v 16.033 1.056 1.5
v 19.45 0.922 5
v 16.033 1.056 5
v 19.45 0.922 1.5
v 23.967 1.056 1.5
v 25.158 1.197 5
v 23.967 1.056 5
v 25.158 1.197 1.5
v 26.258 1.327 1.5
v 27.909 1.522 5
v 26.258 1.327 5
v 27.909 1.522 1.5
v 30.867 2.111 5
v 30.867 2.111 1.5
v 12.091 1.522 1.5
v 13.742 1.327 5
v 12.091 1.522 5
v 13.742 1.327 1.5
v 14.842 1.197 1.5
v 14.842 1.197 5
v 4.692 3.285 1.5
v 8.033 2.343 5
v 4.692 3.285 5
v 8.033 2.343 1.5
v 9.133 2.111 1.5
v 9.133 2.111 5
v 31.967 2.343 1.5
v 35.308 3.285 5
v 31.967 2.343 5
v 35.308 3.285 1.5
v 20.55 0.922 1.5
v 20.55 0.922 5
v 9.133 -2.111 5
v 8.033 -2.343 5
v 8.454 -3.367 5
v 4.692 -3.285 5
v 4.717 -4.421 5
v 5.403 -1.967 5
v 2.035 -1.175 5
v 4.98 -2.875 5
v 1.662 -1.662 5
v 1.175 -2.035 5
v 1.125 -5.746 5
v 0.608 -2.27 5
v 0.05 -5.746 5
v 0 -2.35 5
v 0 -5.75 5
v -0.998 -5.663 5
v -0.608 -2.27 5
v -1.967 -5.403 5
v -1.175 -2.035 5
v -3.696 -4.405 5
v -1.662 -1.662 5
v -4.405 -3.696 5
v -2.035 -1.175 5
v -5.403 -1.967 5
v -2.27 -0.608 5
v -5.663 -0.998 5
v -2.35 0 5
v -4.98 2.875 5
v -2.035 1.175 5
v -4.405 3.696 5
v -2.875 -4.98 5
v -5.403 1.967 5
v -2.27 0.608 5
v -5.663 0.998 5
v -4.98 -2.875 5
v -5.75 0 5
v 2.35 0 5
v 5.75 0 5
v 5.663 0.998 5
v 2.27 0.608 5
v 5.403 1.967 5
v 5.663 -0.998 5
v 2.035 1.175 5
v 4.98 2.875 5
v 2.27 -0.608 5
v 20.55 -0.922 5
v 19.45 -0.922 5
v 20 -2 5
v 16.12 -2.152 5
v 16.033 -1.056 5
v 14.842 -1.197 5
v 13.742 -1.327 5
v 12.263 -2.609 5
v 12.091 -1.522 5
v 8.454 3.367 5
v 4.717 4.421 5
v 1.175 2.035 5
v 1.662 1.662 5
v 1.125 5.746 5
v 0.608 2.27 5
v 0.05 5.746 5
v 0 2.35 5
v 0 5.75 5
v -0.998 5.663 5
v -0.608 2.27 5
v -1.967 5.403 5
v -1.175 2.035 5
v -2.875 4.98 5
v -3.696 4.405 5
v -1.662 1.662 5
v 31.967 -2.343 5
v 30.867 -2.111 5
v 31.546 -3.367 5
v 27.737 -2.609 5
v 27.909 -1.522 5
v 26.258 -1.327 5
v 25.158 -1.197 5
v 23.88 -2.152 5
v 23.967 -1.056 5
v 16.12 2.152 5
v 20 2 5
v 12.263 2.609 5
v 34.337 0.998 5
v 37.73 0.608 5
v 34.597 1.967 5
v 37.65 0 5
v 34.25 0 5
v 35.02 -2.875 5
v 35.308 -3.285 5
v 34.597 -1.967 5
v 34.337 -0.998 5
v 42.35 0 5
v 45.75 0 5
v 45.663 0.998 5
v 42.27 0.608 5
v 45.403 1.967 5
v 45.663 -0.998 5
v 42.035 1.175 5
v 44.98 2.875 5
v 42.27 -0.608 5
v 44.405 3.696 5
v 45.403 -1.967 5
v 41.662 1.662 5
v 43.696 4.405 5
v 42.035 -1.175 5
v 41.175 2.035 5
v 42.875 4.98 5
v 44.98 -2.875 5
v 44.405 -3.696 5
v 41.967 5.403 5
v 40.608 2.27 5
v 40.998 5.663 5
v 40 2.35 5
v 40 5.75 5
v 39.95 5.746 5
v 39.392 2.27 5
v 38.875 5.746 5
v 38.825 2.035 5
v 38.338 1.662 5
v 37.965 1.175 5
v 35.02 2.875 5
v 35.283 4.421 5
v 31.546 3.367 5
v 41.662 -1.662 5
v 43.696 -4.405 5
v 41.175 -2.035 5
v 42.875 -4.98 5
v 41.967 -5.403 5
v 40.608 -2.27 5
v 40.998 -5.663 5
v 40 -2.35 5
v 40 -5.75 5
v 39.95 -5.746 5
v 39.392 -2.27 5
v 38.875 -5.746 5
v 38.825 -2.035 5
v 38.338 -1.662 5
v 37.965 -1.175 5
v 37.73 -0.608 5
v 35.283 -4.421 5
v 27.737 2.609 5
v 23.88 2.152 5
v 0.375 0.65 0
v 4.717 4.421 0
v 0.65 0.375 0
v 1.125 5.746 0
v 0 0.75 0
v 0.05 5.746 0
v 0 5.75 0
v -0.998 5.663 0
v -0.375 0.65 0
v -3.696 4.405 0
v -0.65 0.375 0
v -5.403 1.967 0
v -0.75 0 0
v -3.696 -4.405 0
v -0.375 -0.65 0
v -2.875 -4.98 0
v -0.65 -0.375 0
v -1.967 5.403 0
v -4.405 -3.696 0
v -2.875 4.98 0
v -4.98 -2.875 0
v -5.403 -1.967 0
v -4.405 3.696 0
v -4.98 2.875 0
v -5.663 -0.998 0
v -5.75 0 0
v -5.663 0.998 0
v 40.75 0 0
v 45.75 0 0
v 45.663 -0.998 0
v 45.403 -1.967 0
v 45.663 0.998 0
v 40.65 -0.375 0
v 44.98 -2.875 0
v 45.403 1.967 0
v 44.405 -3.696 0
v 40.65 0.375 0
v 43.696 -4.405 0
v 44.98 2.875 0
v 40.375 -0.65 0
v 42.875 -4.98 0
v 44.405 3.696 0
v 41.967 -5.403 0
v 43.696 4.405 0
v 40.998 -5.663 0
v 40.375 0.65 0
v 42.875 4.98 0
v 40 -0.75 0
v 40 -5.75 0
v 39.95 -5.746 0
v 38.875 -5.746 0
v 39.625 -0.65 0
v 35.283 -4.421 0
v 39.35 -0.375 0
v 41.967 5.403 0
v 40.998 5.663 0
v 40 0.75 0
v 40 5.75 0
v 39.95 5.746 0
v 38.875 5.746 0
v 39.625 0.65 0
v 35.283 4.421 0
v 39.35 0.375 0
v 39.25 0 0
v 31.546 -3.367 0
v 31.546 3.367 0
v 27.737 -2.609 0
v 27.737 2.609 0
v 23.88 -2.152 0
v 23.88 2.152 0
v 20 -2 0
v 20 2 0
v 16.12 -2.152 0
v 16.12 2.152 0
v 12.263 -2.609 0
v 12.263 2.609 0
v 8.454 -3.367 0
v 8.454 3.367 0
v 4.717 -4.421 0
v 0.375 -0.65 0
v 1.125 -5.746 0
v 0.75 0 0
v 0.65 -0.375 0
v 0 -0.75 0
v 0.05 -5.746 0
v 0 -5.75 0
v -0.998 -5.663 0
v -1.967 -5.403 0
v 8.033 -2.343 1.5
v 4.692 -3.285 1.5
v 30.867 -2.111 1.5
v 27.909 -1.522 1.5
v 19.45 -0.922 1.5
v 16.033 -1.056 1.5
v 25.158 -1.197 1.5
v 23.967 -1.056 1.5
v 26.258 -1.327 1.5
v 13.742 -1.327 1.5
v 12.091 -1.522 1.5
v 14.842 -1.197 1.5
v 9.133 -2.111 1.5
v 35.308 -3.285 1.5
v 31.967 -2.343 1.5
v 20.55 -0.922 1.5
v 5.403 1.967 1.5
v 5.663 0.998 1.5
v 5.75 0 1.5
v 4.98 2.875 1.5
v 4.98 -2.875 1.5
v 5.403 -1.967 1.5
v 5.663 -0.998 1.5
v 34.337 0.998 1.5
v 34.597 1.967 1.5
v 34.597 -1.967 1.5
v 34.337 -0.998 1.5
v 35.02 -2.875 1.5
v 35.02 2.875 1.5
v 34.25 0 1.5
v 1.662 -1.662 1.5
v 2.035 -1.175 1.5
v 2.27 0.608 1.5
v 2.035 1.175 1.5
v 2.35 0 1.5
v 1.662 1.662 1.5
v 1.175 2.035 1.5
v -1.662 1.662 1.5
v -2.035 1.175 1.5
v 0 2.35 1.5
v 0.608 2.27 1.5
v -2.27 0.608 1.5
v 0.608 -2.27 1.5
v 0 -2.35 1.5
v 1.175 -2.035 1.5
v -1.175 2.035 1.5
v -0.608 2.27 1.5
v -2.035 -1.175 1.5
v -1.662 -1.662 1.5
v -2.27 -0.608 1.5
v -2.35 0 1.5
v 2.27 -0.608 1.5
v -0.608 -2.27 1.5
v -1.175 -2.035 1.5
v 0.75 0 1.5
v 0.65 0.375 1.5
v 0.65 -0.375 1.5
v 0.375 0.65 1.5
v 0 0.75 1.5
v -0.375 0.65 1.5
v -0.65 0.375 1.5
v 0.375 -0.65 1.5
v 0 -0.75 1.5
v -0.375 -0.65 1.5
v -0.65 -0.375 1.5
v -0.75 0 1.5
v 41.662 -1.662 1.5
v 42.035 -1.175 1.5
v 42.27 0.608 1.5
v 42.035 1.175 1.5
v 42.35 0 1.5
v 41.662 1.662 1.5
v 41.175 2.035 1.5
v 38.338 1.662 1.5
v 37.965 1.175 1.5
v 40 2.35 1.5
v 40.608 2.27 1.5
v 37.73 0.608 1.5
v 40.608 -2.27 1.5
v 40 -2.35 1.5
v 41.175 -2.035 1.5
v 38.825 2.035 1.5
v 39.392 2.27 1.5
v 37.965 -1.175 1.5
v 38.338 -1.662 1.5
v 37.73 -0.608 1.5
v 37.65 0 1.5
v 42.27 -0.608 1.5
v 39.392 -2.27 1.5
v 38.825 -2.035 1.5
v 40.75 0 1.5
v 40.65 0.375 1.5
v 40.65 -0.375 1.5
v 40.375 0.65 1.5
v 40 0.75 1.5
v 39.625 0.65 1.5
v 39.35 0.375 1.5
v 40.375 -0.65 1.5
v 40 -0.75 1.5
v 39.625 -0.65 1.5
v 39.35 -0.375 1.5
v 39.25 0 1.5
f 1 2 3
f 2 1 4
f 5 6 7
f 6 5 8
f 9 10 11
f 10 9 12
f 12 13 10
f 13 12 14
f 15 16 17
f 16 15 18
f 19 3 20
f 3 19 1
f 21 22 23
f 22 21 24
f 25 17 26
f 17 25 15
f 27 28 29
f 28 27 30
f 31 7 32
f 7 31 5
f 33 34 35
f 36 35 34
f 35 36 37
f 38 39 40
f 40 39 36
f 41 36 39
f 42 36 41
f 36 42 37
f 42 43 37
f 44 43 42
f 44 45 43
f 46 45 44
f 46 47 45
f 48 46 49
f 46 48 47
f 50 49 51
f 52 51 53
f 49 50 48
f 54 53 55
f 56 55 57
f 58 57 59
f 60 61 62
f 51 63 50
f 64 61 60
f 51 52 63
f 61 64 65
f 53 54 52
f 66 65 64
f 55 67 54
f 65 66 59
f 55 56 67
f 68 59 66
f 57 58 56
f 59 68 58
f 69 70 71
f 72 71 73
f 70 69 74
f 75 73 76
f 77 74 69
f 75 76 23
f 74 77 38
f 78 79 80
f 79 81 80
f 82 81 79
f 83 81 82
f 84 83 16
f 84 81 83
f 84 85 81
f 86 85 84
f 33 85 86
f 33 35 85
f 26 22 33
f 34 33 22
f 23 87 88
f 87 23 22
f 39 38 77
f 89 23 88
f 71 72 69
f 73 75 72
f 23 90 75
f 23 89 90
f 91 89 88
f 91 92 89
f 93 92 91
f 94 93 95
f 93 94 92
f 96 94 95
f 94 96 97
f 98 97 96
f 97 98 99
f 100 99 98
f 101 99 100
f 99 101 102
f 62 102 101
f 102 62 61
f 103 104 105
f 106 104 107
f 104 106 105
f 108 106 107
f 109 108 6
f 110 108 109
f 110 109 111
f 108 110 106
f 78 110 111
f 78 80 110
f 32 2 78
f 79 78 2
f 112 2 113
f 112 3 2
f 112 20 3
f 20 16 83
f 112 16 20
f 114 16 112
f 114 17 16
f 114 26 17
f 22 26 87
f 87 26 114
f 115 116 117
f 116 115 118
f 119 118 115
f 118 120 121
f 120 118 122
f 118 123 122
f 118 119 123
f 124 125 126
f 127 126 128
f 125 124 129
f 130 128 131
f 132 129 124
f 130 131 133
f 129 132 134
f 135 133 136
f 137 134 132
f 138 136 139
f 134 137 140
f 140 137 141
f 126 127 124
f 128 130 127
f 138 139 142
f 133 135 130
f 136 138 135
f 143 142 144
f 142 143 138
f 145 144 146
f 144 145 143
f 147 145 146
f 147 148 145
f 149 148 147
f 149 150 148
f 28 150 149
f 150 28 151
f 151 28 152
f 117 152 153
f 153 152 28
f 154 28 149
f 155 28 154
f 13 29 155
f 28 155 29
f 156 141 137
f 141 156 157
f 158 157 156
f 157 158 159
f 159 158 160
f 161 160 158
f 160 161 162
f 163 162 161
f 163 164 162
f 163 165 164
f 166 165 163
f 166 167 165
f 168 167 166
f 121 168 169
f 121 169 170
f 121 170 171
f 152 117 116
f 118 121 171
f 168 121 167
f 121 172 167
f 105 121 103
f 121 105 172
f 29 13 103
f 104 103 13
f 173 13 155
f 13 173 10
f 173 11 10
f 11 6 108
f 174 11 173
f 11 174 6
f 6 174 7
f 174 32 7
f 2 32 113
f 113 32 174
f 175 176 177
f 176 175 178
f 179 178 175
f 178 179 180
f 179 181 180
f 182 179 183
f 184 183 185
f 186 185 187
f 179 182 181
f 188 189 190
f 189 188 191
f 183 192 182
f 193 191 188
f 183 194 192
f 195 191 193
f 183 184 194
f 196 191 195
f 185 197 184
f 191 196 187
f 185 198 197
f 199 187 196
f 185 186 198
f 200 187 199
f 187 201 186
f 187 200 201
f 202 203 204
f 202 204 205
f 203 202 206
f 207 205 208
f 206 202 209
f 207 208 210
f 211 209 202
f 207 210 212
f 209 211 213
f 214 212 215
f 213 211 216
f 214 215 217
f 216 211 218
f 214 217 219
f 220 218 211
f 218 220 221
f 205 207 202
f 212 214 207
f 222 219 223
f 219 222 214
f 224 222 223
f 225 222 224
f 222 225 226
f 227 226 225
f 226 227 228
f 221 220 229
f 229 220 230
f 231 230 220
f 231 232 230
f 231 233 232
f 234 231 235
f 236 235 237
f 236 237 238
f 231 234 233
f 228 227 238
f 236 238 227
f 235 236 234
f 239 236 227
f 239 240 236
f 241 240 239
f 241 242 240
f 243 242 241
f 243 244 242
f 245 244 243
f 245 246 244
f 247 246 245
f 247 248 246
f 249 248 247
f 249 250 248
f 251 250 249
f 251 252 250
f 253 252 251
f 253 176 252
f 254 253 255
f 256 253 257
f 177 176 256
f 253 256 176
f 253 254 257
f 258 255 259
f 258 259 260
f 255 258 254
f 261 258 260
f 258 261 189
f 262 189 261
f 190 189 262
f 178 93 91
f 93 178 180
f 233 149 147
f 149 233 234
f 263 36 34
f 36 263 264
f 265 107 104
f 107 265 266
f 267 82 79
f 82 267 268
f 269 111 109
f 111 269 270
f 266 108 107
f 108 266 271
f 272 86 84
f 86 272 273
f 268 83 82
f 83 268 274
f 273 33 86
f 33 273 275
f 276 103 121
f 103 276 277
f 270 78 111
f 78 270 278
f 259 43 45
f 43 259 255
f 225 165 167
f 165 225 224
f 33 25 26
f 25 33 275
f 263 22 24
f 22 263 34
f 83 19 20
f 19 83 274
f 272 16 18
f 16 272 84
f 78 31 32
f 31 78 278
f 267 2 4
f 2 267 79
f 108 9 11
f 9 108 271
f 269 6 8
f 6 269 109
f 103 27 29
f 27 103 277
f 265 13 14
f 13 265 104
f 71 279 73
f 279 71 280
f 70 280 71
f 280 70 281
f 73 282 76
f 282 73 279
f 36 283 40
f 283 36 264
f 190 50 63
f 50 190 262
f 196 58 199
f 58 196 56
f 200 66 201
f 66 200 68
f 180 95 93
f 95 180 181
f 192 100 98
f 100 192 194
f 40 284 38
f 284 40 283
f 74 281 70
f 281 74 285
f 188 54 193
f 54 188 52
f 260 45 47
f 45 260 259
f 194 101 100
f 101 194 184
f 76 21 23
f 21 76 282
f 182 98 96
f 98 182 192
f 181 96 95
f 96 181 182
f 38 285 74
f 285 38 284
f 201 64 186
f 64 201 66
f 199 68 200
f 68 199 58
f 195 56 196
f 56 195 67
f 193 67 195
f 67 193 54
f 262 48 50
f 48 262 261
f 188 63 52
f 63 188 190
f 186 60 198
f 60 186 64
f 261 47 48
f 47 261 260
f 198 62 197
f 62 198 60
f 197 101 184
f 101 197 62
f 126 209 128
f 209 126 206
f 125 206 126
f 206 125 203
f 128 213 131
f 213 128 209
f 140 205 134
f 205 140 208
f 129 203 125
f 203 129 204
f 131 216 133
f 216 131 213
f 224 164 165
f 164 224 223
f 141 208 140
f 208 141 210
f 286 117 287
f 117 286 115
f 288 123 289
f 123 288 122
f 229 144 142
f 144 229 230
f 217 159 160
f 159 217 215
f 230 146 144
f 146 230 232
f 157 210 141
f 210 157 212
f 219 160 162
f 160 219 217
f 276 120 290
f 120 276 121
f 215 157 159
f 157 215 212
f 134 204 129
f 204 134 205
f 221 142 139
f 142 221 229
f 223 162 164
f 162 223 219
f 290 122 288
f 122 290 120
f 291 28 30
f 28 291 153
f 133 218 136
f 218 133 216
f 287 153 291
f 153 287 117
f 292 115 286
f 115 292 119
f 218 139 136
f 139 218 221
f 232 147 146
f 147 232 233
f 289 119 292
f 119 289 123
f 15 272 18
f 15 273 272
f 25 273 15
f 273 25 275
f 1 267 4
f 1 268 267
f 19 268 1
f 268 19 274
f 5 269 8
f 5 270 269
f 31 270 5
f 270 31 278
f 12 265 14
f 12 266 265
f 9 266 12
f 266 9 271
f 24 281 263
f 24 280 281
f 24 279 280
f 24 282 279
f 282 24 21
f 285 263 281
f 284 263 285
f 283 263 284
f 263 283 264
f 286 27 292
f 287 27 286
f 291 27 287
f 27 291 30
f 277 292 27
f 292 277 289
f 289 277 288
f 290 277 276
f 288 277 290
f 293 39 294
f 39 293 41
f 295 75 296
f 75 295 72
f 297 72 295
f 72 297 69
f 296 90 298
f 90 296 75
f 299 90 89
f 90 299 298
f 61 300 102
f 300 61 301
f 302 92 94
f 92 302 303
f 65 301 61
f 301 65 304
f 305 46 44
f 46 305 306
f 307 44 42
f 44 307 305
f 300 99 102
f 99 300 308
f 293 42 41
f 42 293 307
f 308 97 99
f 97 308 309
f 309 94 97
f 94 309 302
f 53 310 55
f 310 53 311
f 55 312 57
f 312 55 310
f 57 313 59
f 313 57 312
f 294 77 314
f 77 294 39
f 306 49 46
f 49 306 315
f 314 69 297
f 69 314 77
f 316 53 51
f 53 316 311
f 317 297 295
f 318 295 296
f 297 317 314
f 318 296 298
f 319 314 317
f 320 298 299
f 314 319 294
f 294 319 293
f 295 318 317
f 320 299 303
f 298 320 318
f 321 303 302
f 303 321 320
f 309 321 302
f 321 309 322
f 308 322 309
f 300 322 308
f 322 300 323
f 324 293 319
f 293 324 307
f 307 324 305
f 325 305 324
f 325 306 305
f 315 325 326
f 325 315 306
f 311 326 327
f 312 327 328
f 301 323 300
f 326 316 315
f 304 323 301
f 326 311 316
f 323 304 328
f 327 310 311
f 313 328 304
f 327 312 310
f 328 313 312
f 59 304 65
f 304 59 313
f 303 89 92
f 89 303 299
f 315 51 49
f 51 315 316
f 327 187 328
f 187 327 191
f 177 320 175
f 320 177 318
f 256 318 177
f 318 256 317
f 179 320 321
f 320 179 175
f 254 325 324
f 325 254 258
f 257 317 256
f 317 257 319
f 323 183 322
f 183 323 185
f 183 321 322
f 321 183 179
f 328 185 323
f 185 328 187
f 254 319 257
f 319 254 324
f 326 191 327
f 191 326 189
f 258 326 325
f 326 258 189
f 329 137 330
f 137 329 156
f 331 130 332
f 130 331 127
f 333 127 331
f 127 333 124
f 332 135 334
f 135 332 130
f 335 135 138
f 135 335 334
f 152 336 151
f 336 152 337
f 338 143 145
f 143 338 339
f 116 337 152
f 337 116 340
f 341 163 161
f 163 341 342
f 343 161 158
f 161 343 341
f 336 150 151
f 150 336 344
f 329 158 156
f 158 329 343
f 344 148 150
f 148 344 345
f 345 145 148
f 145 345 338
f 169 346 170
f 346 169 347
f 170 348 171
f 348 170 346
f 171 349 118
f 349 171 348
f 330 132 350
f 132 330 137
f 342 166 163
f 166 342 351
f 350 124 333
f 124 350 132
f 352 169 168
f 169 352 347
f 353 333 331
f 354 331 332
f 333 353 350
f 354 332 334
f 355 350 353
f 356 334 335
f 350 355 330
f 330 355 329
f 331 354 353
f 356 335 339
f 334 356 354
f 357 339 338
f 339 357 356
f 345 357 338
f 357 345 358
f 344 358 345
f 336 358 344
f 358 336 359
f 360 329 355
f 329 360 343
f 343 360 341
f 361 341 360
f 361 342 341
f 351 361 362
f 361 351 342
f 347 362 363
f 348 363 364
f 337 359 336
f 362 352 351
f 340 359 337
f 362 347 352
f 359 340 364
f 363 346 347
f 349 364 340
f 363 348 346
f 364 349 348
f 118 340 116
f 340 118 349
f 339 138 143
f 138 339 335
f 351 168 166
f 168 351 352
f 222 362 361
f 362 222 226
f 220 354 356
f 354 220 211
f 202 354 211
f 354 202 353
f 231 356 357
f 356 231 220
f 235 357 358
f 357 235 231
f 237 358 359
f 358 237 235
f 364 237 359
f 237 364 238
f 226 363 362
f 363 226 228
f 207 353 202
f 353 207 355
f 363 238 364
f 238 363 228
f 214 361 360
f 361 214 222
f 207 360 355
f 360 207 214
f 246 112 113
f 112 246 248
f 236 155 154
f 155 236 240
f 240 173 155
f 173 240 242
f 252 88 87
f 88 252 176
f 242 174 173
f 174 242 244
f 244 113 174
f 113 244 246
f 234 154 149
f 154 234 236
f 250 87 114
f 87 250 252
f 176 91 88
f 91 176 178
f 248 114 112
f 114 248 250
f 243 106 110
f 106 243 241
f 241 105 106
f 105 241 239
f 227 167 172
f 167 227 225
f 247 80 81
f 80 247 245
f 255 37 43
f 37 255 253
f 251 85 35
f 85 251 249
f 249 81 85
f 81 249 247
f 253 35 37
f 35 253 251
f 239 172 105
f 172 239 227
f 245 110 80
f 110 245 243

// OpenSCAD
// Length 
distance=40;
		
// Number of sabilizers
num=5;		
		
// Thickness of the middle part
ralt=4;		
	
// Servos plateau diameter 	
plateau =11.5;   
	
// Bottom wall height
wall=1.5;	
		
// Bridge sabiziber width
stab=1.1;			

// Thickness of screw retention
height=1.5;	

// Height of gear connector		
zdim=3.5;		
// Diameter of gear connector	
rdim=4.7;	

// Gear connector's screw bolt diameter		
screw=1.5;			

//////////////////////////////////////////////////////////////////////////////////////////////
// Servo double horn (press fit)
//
// Copyright (C) 2013  Lochner, Jürgen
// http://www.thingiverse.com/Ablapo/designs
//
// This program is free software; you can redistribute it and/or
// modify it under the terms of the GNU General Public License
// as published by the Free Software Foundation; either version 2
// of the License, or (at your option) any later version.
//
// This program is distributed in the hope that it will be useful,
// but WITHOUT ANY WARRANTY; without even the implied warranty of
// MERCHANTABILITY or FITNESS FOR A PARTICULAR PURPOSE.  See the
// GNU General Public License for more details.
//
// You should have received a copy of the GNU General Public License
// along with this program; if not, write to the Free Software
// Foundation, Inc., 51 Franklin Street, Fifth Floor, Boston, MA  02110-1301, USA.
/////////////////////////////////////////////////////////////////////////////////////////////////

nustart=(distance-plateau/2)/(num+1)+plateau/4;										// calculate start position for sabilizers
nudist=(distance-plateau/2)/(num+1);												// calculate distance of stabilizers

rcut = ( distance/2*distance/2 +ralt*ralt/4 - plateau*plateau/4)/2/(plateau/2-ralt/2);		// calculate cutting radius
bwidth = plateau/2* sin(atan((ralt/2+rcut)/ralt*2) )*2;									// calculate bridge width

difference(){
	union(){	
		translate([0,0,(zdim+height)/2]) cylinder (h=zdim+height,r=plateau/2, center=true,$fn=36);								// right plateau
		translate([distance,0,(zdim+height)/2]) cylinder (h=zdim+height,r=plateau/2, center=true,$fn=36);							// left plateau

		translate([distance/2,0,wall/2]) cube([distance,bwidth,wall],center=true);													// bridge bottom wall

		intersection(){																											// upper side wall
			translate([distance/2,rcut+ralt/2,(zdim+height)/2]) cylinder (h=zdim+height+1,r=rcut+stab, center=true,$fn=80);	
			translate([distance/2,0,(zdim+height)/2]) cube([distance,bwidth,zdim+height],center=true);		
		}
		intersection(){																											// lower side wall
			translate([distance/2,-(rcut+ralt/2),(zdim+height)/2]) cylinder (h=zdim+height+1,r=rcut+stab, center=true,$fn=80);	
			translate([distance/2,0,(zdim+height)/2]) cube([distance,bwidth,zdim+height],center=true);		
		}
		for (i = [0:1:num-1]) {translate([nustart+i*nudist,0,(zdim+height)/2]) cube([stab,bwidth,zdim+height],center=true);	}		// stabilizers
	}

	translate([0,0,(zdim+height)/2+height]) cylinder (h=zdim+height,r=rdim/2, center=true,$fn=24);				// cut right gear connector	
	translate([0,0,(zdim+height)/2-0.1]) cylinder (h=zdim+height+1,r=screw/2, center=true,$fn=12);				// cut right screw hole

	translate([distance,0,(zdim+height)/2+height]) cylinder (h=zdim+height,r=rdim/2, center=true,$fn=24);			// cut left gear connector	
	translate([distance,0,(zdim+height)/2-0.1]) cylinder (h=zdim+height+1,r=screw/2, center=true,$fn=12);		// cut left screw hole

	translate([distance/2,rcut+ralt/2,(zdim+height)/2]) cylinder (h=zdim+height+1,r=rcut, center=true,$fn=80);			// cut round shape
	translate([distance/2,-(rcut+ralt/2),(zdim+height)/2]) cylinder (h=zdim+height+1,r=rcut, center=true,$fn=80);		// cut round shape
}
